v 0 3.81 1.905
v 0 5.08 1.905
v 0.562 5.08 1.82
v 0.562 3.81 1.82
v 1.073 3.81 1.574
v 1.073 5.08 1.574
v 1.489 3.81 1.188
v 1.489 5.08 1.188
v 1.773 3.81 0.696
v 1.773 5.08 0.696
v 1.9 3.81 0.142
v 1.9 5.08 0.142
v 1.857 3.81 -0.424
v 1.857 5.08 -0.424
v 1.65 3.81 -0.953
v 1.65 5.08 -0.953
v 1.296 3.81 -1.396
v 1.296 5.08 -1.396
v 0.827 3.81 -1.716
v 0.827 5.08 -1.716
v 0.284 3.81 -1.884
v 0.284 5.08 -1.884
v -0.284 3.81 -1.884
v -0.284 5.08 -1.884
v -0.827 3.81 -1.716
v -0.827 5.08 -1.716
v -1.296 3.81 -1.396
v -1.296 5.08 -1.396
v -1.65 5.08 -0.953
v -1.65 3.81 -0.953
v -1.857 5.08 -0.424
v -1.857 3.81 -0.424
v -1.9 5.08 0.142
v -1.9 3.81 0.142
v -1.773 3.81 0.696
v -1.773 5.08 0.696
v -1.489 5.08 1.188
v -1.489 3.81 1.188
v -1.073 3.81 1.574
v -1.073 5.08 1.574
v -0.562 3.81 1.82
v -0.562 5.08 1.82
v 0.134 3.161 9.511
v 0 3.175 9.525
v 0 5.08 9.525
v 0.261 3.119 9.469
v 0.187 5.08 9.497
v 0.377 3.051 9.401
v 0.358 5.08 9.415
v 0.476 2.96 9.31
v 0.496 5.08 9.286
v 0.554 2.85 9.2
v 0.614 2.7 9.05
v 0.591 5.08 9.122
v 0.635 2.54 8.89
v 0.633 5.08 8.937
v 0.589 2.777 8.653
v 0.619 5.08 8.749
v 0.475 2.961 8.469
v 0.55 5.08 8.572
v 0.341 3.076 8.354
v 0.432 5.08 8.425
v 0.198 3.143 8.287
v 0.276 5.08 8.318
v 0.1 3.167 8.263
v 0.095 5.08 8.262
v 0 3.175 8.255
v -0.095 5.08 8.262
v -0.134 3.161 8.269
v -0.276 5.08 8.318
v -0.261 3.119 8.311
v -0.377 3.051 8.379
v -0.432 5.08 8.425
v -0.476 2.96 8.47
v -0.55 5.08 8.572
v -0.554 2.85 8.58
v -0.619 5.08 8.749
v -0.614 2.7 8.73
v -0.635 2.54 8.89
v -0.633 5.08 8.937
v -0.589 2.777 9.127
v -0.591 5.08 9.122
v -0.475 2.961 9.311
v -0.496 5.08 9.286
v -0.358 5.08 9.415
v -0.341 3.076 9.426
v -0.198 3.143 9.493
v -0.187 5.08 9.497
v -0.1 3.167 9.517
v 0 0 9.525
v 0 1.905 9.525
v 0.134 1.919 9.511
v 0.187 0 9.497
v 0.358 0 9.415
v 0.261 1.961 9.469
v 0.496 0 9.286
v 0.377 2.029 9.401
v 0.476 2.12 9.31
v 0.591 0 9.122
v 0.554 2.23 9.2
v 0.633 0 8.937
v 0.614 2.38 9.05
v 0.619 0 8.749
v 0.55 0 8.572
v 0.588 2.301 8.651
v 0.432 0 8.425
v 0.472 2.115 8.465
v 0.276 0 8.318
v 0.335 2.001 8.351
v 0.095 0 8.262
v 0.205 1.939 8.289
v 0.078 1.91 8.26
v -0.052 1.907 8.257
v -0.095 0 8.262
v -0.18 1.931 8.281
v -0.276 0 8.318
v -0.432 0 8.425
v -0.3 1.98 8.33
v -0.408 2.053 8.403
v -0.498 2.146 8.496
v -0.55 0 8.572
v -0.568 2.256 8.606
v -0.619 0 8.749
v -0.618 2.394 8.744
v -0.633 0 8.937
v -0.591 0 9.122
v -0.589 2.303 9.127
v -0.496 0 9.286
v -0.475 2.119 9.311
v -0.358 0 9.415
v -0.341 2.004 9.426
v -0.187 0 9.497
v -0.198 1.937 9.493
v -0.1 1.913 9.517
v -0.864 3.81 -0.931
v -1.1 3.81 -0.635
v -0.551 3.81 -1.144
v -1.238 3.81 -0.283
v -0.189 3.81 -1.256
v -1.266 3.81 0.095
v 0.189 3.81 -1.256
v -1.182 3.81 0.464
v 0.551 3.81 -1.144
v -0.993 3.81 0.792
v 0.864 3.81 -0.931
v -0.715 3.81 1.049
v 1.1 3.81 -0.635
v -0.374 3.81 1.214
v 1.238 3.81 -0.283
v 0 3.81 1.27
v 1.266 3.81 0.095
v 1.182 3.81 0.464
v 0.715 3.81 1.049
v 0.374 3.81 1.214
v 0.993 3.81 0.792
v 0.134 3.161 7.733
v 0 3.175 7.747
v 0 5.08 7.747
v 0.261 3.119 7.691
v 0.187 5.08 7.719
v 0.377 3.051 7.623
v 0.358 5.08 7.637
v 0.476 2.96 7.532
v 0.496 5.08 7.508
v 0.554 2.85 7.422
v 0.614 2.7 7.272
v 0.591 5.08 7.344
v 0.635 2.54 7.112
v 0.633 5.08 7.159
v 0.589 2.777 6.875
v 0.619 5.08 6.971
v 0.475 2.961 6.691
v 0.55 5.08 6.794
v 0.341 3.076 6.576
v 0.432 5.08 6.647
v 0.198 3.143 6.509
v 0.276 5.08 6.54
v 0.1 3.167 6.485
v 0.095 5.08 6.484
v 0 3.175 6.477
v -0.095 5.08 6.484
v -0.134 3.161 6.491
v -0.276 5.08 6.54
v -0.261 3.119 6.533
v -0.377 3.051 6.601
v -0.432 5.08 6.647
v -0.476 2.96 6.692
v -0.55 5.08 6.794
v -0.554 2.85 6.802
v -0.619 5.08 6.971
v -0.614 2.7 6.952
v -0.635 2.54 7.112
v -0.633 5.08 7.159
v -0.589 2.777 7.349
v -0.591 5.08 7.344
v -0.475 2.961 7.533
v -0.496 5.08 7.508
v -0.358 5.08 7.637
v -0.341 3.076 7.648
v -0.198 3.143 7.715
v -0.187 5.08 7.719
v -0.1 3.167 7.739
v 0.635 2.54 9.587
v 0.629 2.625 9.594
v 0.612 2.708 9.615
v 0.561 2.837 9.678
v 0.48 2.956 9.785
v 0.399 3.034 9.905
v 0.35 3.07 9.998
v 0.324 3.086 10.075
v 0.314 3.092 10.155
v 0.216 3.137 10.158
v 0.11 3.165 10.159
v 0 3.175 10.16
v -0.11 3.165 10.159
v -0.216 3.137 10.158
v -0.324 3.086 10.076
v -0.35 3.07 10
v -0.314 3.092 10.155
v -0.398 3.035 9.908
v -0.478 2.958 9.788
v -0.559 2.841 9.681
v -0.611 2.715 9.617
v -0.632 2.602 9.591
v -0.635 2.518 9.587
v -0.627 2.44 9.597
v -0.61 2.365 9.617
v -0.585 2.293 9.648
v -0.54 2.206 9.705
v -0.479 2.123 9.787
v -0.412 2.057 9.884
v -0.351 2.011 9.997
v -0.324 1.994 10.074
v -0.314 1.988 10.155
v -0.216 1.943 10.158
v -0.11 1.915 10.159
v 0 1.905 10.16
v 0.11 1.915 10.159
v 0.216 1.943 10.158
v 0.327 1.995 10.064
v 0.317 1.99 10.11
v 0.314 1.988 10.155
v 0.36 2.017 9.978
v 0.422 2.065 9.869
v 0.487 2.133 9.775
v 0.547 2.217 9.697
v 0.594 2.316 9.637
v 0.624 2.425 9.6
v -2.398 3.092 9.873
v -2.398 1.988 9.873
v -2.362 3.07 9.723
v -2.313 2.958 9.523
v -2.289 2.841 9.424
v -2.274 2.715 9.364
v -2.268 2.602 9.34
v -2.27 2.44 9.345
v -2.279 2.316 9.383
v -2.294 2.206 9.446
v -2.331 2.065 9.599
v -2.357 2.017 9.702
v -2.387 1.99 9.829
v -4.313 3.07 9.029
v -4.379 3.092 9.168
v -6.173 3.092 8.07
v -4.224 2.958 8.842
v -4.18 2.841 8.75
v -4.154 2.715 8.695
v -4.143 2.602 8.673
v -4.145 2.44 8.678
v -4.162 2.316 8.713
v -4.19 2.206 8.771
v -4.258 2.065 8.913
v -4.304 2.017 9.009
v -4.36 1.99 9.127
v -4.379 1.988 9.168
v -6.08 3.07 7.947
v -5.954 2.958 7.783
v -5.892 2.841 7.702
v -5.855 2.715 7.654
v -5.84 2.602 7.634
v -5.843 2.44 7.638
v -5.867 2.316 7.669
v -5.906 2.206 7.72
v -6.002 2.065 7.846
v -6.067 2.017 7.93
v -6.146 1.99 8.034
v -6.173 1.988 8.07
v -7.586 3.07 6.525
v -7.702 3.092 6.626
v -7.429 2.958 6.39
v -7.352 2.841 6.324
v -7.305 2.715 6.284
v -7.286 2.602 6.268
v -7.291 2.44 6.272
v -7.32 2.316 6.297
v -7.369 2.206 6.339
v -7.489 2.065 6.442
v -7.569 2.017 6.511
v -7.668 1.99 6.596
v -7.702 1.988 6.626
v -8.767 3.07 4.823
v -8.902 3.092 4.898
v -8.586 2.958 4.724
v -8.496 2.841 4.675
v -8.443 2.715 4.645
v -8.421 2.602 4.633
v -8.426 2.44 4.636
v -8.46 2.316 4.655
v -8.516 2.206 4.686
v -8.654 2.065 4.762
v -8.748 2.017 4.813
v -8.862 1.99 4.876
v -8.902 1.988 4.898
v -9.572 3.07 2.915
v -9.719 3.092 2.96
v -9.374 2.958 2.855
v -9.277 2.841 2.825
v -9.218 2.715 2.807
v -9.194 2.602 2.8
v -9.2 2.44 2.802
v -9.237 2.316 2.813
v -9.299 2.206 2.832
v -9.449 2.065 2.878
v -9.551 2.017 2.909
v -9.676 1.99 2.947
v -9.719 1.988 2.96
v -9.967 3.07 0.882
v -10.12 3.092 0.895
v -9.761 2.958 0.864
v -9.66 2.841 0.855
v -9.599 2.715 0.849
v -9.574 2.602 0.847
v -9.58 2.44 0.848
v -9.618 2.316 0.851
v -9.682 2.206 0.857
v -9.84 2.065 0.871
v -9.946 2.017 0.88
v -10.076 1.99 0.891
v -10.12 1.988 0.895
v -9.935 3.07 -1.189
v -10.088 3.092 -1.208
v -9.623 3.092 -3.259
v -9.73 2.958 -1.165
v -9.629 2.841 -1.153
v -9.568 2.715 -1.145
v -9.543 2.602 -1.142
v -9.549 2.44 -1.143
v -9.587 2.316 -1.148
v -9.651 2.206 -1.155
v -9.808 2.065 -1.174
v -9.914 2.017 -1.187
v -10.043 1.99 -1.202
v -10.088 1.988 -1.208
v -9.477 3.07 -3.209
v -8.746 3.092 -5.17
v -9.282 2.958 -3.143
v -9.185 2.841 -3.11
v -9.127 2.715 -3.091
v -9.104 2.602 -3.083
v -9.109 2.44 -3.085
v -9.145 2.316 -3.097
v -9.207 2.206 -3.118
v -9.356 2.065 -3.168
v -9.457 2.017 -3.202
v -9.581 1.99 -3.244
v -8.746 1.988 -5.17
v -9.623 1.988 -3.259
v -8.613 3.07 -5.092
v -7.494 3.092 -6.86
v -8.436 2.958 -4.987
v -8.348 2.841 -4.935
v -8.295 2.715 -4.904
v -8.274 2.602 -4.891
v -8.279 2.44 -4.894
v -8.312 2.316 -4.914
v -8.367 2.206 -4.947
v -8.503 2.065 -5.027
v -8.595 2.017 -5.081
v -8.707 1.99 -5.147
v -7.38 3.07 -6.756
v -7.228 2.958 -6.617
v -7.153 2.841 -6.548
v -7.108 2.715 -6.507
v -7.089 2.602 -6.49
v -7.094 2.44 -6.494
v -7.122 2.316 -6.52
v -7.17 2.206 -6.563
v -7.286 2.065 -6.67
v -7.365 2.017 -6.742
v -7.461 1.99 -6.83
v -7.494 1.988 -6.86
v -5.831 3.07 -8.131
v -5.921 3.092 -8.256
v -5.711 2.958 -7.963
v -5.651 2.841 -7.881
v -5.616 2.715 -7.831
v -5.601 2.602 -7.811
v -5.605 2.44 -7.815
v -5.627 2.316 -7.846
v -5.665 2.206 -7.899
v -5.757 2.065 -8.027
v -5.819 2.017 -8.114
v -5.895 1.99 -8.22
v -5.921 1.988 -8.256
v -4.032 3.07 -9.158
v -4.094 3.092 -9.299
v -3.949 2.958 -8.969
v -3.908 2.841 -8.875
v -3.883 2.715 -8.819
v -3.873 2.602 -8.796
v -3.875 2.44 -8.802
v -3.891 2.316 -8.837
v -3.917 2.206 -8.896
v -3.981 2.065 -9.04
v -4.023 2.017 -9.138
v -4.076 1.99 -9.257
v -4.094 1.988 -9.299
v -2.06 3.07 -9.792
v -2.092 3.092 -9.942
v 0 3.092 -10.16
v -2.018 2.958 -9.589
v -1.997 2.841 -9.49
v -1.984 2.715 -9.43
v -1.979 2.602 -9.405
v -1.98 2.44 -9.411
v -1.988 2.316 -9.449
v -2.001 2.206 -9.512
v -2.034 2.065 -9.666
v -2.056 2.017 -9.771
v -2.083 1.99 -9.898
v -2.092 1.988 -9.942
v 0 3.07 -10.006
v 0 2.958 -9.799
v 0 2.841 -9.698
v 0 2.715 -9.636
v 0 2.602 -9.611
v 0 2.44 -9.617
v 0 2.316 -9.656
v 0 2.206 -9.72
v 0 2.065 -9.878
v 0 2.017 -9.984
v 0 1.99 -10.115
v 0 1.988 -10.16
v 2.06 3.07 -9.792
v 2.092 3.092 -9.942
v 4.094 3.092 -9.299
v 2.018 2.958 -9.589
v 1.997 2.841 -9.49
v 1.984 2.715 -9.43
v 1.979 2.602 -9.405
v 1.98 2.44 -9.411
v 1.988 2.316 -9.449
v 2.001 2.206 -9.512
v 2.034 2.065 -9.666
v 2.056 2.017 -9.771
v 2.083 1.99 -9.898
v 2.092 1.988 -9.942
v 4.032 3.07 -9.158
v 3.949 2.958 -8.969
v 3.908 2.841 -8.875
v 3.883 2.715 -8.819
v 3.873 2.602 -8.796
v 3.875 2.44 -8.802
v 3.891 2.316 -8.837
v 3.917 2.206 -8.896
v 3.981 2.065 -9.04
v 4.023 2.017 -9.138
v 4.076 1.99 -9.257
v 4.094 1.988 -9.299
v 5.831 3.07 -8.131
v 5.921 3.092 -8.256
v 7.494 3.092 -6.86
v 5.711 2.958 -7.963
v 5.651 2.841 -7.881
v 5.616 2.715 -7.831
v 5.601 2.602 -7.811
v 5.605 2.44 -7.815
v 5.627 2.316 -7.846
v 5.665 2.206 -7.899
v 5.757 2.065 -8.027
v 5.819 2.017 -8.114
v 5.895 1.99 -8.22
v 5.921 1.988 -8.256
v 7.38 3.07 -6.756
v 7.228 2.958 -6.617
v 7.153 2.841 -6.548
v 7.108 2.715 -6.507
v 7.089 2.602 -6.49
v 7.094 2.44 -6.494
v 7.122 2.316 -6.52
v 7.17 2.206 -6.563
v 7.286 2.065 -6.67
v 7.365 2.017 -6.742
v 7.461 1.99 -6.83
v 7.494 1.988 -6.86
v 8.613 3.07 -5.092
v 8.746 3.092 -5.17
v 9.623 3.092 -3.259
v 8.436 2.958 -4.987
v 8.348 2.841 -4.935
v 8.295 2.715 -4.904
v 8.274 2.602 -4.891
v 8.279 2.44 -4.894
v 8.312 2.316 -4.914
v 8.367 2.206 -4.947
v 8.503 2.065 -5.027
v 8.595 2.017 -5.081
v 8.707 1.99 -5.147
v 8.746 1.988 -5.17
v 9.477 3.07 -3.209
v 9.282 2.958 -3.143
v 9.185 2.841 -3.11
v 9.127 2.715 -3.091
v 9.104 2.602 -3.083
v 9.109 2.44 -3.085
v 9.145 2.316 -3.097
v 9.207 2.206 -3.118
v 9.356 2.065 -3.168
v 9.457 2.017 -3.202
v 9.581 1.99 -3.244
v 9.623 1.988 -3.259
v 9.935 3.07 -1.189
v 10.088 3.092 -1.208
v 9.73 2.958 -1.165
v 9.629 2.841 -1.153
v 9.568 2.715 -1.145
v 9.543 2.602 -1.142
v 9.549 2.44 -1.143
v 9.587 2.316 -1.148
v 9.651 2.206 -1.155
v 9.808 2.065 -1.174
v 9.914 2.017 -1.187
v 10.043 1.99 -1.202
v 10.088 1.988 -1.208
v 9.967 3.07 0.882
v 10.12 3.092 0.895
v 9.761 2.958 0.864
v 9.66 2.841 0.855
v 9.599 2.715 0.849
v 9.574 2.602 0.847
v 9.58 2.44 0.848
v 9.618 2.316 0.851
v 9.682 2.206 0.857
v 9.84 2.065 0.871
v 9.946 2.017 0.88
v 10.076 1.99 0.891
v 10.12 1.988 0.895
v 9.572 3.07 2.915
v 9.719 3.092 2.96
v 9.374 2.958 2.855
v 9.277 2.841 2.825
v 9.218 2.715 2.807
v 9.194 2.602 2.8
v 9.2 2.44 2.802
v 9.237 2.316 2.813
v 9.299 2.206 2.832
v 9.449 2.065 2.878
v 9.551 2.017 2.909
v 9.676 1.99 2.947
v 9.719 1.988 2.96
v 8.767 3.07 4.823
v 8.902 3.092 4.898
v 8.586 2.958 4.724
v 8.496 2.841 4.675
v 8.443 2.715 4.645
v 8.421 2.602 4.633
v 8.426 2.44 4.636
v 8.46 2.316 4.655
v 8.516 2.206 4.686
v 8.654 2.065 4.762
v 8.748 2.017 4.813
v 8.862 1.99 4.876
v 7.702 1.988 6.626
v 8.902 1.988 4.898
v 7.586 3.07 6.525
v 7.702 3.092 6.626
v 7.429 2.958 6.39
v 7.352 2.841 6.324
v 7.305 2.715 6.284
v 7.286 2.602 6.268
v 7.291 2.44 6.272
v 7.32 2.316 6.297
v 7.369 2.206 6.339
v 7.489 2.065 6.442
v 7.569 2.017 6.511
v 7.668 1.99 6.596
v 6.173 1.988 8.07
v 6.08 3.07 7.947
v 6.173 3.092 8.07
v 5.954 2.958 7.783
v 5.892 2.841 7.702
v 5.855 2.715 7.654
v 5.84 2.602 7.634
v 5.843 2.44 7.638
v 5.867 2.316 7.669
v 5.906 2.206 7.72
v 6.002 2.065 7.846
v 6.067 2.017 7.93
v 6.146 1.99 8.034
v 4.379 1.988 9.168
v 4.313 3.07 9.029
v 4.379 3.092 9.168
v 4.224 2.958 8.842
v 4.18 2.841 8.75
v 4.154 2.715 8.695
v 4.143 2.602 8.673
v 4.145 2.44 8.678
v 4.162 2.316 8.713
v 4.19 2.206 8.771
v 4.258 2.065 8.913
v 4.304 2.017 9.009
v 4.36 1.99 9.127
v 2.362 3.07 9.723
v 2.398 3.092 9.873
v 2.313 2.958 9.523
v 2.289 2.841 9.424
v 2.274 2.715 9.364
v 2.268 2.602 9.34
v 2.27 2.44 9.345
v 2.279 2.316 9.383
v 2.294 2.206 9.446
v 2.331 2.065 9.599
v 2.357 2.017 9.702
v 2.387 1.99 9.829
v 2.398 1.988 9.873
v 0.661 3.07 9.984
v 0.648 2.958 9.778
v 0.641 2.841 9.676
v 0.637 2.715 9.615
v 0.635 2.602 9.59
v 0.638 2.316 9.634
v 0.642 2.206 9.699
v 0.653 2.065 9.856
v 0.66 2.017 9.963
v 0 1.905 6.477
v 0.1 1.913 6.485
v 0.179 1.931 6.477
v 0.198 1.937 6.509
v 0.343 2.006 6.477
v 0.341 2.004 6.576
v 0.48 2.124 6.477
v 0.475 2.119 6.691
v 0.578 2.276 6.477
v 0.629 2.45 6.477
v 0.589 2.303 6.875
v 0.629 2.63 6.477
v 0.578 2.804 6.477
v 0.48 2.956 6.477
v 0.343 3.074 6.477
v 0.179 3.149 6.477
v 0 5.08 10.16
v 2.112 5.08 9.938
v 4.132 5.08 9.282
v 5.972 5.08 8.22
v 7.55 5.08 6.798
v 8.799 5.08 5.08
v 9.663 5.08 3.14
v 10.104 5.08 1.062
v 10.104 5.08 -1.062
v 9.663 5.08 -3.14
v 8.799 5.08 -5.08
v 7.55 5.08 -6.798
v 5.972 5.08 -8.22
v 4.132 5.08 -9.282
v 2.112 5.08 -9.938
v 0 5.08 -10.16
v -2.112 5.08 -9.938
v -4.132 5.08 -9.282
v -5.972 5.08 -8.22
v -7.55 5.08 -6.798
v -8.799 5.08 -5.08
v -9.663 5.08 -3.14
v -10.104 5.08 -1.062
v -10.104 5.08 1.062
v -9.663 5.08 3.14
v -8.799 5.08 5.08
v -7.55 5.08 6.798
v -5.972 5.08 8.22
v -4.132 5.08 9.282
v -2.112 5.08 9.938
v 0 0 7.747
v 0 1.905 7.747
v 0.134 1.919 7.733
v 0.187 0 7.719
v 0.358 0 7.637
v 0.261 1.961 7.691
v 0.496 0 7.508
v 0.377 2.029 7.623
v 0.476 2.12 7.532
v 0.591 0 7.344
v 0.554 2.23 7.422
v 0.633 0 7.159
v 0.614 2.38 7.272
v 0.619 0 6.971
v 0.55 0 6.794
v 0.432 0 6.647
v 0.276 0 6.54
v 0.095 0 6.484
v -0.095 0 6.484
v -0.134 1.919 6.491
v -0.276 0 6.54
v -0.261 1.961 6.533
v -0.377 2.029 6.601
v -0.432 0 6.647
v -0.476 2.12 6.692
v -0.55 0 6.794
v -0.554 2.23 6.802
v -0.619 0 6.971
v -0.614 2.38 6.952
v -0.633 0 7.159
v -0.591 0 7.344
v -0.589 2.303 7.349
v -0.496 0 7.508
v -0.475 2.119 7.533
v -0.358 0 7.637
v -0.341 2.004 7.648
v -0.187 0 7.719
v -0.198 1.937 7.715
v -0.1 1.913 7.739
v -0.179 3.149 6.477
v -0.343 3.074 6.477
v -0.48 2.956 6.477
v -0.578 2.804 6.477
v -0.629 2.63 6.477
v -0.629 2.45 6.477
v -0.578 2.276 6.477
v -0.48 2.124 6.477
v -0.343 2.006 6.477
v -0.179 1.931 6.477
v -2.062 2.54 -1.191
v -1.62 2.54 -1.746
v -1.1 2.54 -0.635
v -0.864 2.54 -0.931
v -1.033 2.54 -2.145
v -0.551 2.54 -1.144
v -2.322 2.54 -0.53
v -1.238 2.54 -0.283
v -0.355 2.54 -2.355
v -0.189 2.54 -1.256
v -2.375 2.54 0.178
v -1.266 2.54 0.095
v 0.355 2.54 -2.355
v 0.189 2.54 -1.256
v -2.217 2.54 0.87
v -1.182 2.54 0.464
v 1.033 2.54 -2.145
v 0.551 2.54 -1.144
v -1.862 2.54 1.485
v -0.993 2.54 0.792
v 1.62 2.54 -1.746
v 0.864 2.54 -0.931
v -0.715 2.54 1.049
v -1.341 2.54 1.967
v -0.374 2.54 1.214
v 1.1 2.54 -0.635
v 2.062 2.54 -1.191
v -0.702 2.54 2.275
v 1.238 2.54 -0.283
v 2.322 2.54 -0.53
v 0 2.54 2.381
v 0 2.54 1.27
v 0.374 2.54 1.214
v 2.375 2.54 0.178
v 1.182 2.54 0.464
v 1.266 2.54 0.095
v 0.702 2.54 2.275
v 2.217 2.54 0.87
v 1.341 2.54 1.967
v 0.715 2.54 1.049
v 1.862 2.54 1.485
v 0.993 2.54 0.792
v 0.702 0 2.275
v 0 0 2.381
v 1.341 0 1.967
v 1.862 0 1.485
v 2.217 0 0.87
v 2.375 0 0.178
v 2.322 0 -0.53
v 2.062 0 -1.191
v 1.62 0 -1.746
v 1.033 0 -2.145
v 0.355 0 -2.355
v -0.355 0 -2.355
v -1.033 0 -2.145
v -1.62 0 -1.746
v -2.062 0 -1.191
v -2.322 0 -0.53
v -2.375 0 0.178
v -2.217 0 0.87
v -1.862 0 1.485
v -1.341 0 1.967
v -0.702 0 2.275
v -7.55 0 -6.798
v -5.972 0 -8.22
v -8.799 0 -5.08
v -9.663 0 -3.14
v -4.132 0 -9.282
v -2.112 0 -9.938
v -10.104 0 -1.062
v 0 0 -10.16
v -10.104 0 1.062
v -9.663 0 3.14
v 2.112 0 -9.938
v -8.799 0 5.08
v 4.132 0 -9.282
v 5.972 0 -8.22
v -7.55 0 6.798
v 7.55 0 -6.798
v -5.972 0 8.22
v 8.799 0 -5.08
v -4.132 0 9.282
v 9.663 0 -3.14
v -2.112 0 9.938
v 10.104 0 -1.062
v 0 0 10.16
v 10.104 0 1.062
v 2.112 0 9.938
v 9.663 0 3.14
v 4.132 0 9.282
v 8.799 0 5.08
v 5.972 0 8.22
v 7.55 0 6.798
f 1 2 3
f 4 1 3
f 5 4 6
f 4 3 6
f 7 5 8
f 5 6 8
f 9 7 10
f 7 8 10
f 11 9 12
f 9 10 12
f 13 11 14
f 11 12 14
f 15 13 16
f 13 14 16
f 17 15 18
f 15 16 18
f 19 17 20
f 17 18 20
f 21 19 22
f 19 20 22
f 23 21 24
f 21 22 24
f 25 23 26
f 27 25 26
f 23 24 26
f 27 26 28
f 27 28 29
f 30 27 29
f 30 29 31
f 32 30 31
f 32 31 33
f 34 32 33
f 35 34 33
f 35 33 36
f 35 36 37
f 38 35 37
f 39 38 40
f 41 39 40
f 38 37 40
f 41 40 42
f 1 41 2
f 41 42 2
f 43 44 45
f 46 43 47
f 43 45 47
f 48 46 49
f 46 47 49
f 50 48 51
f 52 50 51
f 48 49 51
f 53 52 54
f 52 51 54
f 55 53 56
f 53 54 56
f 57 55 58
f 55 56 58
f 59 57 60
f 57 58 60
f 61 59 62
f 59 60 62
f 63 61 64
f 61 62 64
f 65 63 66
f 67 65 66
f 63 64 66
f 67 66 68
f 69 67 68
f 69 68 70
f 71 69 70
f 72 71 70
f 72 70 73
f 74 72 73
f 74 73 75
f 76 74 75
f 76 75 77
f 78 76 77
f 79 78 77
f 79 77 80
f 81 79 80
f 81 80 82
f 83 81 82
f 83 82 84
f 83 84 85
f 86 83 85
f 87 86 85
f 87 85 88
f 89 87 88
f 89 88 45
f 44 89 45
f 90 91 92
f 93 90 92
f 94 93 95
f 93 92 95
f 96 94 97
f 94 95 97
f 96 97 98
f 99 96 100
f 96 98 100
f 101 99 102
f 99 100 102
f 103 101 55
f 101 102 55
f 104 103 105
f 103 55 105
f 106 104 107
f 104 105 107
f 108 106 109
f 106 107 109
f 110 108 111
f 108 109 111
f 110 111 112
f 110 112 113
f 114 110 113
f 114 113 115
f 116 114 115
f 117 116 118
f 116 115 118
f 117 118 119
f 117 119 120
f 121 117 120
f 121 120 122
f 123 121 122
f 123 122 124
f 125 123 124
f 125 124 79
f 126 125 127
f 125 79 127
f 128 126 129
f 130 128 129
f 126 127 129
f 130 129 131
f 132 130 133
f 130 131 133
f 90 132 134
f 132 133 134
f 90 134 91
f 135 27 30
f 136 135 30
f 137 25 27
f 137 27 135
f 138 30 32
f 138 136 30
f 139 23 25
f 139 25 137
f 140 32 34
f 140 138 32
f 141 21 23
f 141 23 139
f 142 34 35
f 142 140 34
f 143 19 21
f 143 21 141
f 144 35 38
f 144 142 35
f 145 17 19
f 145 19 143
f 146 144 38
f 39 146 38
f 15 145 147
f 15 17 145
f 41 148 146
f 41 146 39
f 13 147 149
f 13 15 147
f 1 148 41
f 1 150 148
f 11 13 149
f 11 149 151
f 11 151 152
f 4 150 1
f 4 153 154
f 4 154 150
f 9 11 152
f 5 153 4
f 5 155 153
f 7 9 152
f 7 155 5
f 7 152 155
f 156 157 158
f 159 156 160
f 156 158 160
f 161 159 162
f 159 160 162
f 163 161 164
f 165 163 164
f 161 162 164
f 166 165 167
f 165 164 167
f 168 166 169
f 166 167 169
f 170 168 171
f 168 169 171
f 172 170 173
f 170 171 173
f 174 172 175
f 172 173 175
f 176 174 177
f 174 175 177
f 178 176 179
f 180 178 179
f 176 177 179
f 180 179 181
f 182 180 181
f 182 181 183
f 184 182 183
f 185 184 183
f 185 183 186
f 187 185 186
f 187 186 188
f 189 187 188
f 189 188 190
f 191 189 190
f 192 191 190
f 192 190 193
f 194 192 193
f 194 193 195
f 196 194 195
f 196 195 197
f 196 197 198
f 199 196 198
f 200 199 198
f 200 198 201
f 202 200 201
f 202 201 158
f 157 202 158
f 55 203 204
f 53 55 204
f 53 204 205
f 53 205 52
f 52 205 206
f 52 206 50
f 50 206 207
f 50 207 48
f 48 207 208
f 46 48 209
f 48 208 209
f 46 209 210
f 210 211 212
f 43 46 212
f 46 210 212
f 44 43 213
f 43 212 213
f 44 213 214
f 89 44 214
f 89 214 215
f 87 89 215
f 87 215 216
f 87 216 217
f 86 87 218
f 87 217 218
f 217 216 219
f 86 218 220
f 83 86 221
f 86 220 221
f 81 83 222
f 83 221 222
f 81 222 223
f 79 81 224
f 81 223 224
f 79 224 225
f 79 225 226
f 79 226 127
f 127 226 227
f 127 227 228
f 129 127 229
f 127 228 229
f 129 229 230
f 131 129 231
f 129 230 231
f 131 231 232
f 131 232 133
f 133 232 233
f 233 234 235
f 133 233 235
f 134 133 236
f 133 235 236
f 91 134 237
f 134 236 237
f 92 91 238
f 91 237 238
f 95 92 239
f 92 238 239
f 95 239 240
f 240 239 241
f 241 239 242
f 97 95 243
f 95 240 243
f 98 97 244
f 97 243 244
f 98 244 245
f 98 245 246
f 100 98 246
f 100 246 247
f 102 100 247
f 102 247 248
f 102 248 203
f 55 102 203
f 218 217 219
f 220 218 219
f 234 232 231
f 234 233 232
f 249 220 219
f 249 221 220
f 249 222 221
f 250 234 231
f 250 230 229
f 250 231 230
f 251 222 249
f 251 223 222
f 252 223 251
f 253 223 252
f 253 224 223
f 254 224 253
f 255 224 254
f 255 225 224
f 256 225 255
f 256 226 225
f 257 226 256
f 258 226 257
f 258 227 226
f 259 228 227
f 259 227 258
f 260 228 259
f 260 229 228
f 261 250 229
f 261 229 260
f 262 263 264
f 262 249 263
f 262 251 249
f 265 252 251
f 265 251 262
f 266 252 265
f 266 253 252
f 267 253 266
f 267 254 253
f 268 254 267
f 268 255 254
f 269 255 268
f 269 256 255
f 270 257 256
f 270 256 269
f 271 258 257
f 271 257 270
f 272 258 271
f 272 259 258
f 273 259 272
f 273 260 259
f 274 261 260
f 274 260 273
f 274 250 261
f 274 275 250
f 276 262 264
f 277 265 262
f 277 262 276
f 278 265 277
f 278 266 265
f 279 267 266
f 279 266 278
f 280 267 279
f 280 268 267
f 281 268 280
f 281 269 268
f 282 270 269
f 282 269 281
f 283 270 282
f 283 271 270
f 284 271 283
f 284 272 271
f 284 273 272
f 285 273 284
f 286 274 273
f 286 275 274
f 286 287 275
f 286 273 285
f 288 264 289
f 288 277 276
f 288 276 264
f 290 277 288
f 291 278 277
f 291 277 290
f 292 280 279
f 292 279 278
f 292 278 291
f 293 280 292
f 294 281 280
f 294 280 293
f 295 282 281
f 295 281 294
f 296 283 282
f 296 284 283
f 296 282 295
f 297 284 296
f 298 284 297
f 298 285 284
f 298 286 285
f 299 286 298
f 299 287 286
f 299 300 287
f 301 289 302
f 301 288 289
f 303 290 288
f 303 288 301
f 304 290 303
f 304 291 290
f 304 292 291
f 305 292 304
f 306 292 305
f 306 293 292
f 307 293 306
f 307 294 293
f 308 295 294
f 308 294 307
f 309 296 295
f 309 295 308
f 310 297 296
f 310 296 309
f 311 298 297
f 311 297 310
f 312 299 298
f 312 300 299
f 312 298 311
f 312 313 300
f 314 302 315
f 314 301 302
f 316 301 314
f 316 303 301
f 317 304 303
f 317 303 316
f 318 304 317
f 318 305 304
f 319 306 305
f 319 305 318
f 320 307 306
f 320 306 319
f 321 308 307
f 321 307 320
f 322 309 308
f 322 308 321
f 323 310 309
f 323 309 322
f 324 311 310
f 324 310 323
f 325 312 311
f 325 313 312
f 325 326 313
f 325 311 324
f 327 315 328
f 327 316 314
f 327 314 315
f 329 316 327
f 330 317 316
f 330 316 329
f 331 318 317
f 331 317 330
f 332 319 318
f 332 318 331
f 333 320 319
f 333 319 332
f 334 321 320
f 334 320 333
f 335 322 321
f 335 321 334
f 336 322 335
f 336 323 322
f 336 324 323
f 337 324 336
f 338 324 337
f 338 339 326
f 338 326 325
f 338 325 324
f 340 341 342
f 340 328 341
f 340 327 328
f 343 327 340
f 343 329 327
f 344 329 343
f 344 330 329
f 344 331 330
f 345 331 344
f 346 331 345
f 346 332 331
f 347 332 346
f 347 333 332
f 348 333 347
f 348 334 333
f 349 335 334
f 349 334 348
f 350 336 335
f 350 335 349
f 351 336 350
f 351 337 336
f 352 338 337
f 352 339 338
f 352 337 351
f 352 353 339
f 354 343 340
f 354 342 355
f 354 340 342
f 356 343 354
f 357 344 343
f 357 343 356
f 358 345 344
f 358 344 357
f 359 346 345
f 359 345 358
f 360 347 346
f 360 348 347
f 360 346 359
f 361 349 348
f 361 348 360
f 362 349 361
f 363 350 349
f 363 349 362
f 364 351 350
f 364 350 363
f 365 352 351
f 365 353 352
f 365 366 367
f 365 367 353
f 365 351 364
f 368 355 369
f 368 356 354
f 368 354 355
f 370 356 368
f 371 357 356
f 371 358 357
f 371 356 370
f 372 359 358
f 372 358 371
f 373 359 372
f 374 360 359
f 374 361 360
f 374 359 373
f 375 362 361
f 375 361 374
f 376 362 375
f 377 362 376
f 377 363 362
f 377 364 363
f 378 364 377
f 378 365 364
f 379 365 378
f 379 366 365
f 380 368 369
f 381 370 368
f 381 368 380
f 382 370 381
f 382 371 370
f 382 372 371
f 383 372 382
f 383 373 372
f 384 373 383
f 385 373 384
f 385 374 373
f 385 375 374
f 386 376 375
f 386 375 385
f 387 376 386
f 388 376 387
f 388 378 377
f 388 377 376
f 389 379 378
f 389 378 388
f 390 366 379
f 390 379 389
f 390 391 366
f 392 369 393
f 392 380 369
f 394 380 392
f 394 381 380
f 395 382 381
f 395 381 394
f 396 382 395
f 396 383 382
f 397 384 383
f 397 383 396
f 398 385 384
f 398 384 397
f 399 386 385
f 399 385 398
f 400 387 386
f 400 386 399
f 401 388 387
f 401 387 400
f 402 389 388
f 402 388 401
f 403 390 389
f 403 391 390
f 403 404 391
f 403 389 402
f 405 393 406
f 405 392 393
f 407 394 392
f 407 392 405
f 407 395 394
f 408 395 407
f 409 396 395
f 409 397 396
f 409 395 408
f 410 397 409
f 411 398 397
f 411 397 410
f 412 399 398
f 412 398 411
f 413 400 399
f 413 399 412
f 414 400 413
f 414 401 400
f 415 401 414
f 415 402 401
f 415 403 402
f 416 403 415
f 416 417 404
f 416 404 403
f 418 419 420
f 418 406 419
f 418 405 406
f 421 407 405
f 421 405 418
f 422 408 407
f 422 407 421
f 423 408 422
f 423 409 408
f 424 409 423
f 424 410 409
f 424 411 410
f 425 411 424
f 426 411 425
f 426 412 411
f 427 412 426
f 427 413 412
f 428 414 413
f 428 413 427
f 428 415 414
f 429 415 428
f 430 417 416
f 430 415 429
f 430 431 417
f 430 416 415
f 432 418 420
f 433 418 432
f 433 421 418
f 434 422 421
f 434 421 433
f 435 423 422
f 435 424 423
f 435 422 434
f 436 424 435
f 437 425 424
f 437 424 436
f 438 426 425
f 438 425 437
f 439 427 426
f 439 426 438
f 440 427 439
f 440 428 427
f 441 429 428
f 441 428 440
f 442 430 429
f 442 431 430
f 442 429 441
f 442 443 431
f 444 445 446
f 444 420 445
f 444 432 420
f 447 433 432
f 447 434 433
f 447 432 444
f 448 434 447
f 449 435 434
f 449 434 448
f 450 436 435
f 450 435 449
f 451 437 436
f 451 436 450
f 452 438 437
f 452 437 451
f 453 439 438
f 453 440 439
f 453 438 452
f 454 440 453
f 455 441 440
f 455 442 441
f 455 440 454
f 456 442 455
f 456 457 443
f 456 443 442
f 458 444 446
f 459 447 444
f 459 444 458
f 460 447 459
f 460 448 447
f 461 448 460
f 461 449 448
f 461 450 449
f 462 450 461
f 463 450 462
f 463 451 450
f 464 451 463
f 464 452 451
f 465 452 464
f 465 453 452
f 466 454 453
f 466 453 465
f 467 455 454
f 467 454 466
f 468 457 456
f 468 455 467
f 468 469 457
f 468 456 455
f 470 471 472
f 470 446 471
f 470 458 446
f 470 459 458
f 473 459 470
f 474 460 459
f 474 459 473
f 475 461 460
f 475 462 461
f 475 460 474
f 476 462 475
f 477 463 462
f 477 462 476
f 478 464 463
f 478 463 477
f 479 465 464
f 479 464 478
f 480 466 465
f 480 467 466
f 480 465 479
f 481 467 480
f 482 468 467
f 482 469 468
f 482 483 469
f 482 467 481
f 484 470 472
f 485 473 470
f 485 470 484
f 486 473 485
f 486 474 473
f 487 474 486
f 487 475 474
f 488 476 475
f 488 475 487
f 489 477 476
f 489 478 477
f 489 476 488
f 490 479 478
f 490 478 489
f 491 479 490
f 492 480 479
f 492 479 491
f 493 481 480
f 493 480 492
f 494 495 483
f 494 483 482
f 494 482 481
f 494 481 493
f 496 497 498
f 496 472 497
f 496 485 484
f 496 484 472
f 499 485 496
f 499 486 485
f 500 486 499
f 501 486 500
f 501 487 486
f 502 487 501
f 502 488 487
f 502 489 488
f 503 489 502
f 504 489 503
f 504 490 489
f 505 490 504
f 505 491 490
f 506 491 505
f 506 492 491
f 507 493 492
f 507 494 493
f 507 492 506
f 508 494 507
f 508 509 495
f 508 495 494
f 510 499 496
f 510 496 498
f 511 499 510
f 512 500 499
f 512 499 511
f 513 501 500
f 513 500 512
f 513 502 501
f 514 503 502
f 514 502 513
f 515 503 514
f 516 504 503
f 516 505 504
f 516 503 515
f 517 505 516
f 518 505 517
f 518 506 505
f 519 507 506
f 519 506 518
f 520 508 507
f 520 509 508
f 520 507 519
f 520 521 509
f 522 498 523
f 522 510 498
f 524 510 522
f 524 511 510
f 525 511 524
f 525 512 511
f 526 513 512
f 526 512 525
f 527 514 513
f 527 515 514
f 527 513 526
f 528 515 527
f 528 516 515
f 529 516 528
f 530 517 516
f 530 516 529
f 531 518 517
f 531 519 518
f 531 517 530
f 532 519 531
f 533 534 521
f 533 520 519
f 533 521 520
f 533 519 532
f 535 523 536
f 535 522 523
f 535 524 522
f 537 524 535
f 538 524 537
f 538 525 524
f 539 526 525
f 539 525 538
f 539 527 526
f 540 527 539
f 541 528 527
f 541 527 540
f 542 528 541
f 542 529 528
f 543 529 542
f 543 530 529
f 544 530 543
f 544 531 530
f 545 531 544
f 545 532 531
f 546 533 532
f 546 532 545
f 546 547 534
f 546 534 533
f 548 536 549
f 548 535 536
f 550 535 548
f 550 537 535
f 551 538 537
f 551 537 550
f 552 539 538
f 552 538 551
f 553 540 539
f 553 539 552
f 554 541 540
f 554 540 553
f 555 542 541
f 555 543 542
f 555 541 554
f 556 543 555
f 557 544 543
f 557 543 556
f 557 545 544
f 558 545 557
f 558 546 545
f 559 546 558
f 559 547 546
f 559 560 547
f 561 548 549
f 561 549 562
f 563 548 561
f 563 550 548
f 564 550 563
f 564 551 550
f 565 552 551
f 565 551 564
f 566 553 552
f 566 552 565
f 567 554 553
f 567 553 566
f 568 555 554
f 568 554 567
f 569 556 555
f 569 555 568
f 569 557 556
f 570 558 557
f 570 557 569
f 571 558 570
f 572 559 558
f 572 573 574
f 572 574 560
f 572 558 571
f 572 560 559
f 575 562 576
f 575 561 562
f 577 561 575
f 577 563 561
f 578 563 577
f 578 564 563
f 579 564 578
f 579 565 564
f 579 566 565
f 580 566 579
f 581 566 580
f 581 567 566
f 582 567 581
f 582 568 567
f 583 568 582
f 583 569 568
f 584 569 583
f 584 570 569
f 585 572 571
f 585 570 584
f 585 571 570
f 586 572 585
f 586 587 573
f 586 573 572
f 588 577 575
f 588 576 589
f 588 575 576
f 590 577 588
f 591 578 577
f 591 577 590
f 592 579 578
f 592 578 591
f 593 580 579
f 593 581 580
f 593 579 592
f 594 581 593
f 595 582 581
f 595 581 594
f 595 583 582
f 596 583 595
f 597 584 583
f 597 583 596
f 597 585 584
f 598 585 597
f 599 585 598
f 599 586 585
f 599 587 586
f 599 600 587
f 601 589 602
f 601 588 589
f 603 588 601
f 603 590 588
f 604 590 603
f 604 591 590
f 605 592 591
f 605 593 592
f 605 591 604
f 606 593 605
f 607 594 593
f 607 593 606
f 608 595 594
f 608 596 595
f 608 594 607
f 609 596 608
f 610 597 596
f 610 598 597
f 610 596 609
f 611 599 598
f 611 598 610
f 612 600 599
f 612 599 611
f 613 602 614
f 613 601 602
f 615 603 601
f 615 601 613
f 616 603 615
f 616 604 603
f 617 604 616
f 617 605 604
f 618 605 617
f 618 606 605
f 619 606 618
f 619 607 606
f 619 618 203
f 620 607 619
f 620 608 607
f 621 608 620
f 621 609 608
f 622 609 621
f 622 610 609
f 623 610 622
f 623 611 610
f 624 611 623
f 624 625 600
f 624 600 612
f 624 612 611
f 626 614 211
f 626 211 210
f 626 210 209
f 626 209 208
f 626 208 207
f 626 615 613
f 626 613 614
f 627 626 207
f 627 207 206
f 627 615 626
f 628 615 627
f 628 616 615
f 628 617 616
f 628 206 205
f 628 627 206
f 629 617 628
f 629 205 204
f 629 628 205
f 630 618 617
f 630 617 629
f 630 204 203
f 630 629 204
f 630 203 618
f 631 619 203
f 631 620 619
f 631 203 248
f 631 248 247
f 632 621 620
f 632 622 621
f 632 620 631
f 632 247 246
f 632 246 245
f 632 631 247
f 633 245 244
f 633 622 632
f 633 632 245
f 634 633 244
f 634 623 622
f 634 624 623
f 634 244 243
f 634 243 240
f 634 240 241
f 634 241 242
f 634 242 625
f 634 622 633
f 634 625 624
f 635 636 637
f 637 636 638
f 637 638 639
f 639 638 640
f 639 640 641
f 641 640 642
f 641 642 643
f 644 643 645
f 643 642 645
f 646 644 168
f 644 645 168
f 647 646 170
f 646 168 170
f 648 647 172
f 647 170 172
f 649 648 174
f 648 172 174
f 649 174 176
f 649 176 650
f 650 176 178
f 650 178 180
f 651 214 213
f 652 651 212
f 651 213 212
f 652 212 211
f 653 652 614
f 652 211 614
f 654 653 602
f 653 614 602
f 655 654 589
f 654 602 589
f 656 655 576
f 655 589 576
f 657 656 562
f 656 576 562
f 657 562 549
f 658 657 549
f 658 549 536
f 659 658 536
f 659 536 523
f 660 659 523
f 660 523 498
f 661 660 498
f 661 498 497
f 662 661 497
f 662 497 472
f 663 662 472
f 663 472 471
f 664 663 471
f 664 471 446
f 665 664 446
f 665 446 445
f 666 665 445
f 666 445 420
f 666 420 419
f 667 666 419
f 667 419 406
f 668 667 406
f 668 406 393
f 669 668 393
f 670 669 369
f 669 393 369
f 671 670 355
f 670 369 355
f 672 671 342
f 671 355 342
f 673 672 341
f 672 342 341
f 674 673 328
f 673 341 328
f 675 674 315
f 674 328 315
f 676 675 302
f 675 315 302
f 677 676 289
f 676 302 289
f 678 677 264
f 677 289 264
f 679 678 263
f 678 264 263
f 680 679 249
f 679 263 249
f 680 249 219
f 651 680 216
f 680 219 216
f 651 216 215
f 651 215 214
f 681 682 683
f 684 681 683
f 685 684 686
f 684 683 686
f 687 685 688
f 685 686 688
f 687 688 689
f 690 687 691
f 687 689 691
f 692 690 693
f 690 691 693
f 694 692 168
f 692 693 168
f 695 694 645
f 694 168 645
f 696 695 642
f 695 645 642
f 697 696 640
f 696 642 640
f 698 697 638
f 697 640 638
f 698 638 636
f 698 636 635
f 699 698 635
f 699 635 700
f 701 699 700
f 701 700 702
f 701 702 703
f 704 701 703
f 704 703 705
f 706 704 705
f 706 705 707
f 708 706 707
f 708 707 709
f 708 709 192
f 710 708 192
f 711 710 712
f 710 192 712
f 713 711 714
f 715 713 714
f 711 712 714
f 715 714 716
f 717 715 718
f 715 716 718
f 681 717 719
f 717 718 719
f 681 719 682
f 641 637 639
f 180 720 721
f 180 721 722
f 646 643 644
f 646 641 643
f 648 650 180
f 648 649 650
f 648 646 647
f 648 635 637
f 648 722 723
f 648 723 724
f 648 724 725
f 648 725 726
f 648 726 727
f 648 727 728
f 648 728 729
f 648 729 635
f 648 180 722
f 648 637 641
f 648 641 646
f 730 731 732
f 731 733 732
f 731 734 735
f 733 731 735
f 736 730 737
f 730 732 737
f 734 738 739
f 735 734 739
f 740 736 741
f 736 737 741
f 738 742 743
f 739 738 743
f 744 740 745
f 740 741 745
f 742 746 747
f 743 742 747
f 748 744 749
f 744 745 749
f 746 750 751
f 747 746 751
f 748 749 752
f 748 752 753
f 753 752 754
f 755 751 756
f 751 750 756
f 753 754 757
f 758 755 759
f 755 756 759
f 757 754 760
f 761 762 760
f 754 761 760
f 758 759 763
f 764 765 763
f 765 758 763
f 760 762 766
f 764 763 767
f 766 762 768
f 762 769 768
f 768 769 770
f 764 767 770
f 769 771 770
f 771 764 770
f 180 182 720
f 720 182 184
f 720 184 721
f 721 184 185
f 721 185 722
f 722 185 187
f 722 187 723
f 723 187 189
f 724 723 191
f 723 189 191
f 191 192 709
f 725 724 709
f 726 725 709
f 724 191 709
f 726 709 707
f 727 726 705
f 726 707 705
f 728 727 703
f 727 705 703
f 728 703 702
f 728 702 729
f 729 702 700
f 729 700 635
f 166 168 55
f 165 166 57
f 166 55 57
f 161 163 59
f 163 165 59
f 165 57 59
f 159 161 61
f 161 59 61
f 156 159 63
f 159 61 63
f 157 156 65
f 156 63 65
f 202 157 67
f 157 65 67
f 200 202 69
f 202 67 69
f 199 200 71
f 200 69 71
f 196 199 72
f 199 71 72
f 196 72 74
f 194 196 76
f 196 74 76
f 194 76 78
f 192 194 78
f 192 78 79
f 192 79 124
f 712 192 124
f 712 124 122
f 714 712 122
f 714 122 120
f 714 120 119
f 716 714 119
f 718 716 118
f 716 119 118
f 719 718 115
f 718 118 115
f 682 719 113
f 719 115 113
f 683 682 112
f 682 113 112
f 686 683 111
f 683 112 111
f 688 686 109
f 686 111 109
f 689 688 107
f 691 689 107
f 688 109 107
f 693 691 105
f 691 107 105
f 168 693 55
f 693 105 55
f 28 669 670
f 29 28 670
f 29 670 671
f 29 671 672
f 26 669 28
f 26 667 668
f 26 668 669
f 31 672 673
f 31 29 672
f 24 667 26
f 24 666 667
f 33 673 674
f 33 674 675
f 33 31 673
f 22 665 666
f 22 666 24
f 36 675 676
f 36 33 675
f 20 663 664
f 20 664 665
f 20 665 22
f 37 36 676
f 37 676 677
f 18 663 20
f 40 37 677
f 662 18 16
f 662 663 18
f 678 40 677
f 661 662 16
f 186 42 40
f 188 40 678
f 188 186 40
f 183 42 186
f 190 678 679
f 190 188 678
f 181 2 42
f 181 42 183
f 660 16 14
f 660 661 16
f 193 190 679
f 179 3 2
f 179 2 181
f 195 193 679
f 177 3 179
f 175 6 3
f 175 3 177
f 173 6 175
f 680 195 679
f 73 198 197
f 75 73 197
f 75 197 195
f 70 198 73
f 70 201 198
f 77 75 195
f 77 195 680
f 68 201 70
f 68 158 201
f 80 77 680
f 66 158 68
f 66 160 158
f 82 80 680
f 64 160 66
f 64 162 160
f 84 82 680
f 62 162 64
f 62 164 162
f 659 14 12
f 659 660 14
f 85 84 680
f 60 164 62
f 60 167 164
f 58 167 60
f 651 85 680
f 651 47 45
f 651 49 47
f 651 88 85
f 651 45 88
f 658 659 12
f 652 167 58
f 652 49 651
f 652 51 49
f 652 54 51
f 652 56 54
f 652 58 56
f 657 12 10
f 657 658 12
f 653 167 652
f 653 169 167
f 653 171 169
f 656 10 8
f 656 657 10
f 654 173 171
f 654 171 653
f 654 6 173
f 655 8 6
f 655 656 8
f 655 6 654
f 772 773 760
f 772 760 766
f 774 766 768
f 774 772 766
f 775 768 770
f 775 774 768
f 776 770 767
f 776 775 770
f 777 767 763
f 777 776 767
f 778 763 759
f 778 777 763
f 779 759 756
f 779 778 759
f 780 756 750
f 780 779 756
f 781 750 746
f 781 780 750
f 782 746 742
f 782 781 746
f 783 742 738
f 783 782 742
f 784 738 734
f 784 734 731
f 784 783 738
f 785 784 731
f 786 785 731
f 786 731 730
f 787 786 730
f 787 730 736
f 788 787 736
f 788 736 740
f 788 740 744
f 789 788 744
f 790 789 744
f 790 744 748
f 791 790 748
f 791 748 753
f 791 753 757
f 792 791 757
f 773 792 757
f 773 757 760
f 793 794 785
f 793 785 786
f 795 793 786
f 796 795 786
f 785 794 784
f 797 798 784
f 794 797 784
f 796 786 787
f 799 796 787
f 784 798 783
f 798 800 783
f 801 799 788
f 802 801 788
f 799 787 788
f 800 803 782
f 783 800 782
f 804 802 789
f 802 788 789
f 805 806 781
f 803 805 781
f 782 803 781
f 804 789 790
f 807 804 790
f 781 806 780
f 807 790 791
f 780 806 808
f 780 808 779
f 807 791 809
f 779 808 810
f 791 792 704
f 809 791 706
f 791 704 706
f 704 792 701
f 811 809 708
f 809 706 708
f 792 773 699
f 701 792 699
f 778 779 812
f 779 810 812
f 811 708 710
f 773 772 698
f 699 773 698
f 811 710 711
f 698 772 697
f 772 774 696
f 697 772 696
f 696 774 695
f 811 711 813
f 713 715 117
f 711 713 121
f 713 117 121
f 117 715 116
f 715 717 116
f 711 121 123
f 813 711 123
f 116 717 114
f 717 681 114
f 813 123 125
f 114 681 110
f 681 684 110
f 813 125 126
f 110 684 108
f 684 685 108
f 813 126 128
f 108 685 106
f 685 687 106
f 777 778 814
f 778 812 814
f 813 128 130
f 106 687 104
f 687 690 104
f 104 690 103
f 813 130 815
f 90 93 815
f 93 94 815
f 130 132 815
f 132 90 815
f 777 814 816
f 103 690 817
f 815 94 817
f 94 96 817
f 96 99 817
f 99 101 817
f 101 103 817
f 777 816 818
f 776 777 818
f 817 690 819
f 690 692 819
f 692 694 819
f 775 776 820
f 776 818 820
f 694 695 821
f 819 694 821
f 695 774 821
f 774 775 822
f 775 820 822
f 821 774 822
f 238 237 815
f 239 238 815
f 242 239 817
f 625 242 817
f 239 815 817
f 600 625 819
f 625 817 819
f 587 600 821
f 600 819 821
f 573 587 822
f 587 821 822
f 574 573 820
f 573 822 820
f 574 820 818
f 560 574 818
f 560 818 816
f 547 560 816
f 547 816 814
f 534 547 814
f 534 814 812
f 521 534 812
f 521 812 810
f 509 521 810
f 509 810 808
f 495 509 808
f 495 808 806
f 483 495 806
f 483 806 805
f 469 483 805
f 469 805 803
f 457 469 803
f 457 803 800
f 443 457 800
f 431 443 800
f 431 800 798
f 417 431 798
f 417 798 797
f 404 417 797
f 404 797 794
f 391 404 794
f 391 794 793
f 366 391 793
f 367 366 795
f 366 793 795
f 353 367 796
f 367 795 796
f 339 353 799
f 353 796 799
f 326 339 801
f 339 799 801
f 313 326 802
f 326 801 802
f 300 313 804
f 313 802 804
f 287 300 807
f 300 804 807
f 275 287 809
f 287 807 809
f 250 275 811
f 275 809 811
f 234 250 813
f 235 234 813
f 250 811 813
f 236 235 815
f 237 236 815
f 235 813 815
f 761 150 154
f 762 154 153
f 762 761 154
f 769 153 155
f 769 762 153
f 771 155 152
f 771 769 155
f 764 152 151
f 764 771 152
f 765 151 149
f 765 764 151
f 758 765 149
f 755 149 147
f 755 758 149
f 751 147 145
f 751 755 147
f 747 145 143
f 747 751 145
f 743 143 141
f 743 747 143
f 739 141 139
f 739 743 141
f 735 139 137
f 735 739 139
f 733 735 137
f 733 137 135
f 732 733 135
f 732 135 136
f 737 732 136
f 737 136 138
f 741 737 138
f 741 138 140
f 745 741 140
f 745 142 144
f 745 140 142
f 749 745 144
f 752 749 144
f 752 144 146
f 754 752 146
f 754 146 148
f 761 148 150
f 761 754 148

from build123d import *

# Parameters (mm, degrees)
SKETCH1_R           = 10.16
SKETCH1_R_2         = 2.38125
BOSS_EXTRUDE1_DEPTH = 5.08
BOSS_EXTRUDE2_START = -2.54
SKETCH2_R           = 2.38125
SKETCH2_R_2         = 1.27
BOSS_EXTRUDE2_DEPTH = 2.54
SKETCH3_R           = 1.905
CUT_EXTRUDE1_DEPTH  = 1.27
SKETCH4_R           = 0.552075519
SKETCH5_R           = 0.635
CUT_EXTRUDE2_DEPTH  = 16.24
SKETCH6_R           = 0.635
CUT_EXTRUDE3_DEPTH  = 3.683


with BuildPart() as part:
    # Sketch1 → Boss-Extrude1 (new body)
    with BuildSketch(Plane(origin=(0, 0, 0), x_dir=(1, 0, 0), z_dir=(0, 1, 0))):
        with Locations(Location((0, 0, 0), (0, 0, 270))):
            Circle(SKETCH1_R)
        with Locations(Location((0, 0, 0), (0, 0, 270))):
            Circle(SKETCH1_R_2, mode=Mode.SUBTRACT)
    extrude(amount=BOSS_EXTRUDE1_DEPTH)

    # Sketch2 → Boss-Extrude2 (add)
    with BuildSketch(Plane(origin=(0, 5.08, 0), x_dir=(1, 0, 0), z_dir=(0, 1, 0)).offset(BOSS_EXTRUDE2_START)):
        with Locations(Location((0, 0, 0), (0, 0, 270))):
            Circle(SKETCH2_R)
        with Locations(Location((0, 0, 0), (0, 0, 270))):
            Circle(SKETCH2_R_2, mode=Mode.SUBTRACT)
    extrude(amount=BOSS_EXTRUDE2_DEPTH)

    # Sketch3 → Cut-Extrude1 (cut)
    with BuildSketch(Plane(origin=(0, 5.08, 0), x_dir=(1, 0, 0), z_dir=(0, 1, 0))):
        with Locations(Location((0, 0, 0), (0, 0, 270))):
            Circle(SKETCH3_R)
    extrude(amount=-CUT_EXTRUDE1_DEPTH, mode=Mode.SUBTRACT)

    # Sketch4 → Cut-Revolve1 (revolve, cut)
    with BuildSketch(Plane.XY, mode=Mode.PRIVATE) as cut_revolve1_sk:
        with Locations((10.16, 2.54)):
            Circle(SKETCH4_R)
    revolve(cut_revolve1_sk.sketch.rotate(Axis((0, 6.474479785, 0), (0, -1, 0)), 90), axis=Axis((0, 6.474479785, 0), (0, -1, 0)), mode=Mode.SUBTRACT)

    # Sketch5 → Cut-Extrude2 (cut, through all)
    with BuildSketch(Plane(origin=(0, 5.08, 0), x_dir=(1, 0, 0), z_dir=(0, 1, 0))):
        with Locations(Location((0, -8.89, 0), (0, 0, 270))):
            Circle(SKETCH5_R)
        with Locations(Location((0, -7.112, 0), (0, 0, 270))):
            Circle(SKETCH5_R)
    extrude(amount=-CUT_EXTRUDE2_DEPTH, mode=Mode.SUBTRACT)

    # Sketch6 → Cut-Extrude3 (cut)
    with BuildSketch(Plane.XY.offset(10.16)):
        with Locations((0, 2.54)):
            Circle(SKETCH6_R)
    extrude(amount=-CUT_EXTRUDE3_DEPTH, mode=Mode.SUBTRACT)


solid = part.part
